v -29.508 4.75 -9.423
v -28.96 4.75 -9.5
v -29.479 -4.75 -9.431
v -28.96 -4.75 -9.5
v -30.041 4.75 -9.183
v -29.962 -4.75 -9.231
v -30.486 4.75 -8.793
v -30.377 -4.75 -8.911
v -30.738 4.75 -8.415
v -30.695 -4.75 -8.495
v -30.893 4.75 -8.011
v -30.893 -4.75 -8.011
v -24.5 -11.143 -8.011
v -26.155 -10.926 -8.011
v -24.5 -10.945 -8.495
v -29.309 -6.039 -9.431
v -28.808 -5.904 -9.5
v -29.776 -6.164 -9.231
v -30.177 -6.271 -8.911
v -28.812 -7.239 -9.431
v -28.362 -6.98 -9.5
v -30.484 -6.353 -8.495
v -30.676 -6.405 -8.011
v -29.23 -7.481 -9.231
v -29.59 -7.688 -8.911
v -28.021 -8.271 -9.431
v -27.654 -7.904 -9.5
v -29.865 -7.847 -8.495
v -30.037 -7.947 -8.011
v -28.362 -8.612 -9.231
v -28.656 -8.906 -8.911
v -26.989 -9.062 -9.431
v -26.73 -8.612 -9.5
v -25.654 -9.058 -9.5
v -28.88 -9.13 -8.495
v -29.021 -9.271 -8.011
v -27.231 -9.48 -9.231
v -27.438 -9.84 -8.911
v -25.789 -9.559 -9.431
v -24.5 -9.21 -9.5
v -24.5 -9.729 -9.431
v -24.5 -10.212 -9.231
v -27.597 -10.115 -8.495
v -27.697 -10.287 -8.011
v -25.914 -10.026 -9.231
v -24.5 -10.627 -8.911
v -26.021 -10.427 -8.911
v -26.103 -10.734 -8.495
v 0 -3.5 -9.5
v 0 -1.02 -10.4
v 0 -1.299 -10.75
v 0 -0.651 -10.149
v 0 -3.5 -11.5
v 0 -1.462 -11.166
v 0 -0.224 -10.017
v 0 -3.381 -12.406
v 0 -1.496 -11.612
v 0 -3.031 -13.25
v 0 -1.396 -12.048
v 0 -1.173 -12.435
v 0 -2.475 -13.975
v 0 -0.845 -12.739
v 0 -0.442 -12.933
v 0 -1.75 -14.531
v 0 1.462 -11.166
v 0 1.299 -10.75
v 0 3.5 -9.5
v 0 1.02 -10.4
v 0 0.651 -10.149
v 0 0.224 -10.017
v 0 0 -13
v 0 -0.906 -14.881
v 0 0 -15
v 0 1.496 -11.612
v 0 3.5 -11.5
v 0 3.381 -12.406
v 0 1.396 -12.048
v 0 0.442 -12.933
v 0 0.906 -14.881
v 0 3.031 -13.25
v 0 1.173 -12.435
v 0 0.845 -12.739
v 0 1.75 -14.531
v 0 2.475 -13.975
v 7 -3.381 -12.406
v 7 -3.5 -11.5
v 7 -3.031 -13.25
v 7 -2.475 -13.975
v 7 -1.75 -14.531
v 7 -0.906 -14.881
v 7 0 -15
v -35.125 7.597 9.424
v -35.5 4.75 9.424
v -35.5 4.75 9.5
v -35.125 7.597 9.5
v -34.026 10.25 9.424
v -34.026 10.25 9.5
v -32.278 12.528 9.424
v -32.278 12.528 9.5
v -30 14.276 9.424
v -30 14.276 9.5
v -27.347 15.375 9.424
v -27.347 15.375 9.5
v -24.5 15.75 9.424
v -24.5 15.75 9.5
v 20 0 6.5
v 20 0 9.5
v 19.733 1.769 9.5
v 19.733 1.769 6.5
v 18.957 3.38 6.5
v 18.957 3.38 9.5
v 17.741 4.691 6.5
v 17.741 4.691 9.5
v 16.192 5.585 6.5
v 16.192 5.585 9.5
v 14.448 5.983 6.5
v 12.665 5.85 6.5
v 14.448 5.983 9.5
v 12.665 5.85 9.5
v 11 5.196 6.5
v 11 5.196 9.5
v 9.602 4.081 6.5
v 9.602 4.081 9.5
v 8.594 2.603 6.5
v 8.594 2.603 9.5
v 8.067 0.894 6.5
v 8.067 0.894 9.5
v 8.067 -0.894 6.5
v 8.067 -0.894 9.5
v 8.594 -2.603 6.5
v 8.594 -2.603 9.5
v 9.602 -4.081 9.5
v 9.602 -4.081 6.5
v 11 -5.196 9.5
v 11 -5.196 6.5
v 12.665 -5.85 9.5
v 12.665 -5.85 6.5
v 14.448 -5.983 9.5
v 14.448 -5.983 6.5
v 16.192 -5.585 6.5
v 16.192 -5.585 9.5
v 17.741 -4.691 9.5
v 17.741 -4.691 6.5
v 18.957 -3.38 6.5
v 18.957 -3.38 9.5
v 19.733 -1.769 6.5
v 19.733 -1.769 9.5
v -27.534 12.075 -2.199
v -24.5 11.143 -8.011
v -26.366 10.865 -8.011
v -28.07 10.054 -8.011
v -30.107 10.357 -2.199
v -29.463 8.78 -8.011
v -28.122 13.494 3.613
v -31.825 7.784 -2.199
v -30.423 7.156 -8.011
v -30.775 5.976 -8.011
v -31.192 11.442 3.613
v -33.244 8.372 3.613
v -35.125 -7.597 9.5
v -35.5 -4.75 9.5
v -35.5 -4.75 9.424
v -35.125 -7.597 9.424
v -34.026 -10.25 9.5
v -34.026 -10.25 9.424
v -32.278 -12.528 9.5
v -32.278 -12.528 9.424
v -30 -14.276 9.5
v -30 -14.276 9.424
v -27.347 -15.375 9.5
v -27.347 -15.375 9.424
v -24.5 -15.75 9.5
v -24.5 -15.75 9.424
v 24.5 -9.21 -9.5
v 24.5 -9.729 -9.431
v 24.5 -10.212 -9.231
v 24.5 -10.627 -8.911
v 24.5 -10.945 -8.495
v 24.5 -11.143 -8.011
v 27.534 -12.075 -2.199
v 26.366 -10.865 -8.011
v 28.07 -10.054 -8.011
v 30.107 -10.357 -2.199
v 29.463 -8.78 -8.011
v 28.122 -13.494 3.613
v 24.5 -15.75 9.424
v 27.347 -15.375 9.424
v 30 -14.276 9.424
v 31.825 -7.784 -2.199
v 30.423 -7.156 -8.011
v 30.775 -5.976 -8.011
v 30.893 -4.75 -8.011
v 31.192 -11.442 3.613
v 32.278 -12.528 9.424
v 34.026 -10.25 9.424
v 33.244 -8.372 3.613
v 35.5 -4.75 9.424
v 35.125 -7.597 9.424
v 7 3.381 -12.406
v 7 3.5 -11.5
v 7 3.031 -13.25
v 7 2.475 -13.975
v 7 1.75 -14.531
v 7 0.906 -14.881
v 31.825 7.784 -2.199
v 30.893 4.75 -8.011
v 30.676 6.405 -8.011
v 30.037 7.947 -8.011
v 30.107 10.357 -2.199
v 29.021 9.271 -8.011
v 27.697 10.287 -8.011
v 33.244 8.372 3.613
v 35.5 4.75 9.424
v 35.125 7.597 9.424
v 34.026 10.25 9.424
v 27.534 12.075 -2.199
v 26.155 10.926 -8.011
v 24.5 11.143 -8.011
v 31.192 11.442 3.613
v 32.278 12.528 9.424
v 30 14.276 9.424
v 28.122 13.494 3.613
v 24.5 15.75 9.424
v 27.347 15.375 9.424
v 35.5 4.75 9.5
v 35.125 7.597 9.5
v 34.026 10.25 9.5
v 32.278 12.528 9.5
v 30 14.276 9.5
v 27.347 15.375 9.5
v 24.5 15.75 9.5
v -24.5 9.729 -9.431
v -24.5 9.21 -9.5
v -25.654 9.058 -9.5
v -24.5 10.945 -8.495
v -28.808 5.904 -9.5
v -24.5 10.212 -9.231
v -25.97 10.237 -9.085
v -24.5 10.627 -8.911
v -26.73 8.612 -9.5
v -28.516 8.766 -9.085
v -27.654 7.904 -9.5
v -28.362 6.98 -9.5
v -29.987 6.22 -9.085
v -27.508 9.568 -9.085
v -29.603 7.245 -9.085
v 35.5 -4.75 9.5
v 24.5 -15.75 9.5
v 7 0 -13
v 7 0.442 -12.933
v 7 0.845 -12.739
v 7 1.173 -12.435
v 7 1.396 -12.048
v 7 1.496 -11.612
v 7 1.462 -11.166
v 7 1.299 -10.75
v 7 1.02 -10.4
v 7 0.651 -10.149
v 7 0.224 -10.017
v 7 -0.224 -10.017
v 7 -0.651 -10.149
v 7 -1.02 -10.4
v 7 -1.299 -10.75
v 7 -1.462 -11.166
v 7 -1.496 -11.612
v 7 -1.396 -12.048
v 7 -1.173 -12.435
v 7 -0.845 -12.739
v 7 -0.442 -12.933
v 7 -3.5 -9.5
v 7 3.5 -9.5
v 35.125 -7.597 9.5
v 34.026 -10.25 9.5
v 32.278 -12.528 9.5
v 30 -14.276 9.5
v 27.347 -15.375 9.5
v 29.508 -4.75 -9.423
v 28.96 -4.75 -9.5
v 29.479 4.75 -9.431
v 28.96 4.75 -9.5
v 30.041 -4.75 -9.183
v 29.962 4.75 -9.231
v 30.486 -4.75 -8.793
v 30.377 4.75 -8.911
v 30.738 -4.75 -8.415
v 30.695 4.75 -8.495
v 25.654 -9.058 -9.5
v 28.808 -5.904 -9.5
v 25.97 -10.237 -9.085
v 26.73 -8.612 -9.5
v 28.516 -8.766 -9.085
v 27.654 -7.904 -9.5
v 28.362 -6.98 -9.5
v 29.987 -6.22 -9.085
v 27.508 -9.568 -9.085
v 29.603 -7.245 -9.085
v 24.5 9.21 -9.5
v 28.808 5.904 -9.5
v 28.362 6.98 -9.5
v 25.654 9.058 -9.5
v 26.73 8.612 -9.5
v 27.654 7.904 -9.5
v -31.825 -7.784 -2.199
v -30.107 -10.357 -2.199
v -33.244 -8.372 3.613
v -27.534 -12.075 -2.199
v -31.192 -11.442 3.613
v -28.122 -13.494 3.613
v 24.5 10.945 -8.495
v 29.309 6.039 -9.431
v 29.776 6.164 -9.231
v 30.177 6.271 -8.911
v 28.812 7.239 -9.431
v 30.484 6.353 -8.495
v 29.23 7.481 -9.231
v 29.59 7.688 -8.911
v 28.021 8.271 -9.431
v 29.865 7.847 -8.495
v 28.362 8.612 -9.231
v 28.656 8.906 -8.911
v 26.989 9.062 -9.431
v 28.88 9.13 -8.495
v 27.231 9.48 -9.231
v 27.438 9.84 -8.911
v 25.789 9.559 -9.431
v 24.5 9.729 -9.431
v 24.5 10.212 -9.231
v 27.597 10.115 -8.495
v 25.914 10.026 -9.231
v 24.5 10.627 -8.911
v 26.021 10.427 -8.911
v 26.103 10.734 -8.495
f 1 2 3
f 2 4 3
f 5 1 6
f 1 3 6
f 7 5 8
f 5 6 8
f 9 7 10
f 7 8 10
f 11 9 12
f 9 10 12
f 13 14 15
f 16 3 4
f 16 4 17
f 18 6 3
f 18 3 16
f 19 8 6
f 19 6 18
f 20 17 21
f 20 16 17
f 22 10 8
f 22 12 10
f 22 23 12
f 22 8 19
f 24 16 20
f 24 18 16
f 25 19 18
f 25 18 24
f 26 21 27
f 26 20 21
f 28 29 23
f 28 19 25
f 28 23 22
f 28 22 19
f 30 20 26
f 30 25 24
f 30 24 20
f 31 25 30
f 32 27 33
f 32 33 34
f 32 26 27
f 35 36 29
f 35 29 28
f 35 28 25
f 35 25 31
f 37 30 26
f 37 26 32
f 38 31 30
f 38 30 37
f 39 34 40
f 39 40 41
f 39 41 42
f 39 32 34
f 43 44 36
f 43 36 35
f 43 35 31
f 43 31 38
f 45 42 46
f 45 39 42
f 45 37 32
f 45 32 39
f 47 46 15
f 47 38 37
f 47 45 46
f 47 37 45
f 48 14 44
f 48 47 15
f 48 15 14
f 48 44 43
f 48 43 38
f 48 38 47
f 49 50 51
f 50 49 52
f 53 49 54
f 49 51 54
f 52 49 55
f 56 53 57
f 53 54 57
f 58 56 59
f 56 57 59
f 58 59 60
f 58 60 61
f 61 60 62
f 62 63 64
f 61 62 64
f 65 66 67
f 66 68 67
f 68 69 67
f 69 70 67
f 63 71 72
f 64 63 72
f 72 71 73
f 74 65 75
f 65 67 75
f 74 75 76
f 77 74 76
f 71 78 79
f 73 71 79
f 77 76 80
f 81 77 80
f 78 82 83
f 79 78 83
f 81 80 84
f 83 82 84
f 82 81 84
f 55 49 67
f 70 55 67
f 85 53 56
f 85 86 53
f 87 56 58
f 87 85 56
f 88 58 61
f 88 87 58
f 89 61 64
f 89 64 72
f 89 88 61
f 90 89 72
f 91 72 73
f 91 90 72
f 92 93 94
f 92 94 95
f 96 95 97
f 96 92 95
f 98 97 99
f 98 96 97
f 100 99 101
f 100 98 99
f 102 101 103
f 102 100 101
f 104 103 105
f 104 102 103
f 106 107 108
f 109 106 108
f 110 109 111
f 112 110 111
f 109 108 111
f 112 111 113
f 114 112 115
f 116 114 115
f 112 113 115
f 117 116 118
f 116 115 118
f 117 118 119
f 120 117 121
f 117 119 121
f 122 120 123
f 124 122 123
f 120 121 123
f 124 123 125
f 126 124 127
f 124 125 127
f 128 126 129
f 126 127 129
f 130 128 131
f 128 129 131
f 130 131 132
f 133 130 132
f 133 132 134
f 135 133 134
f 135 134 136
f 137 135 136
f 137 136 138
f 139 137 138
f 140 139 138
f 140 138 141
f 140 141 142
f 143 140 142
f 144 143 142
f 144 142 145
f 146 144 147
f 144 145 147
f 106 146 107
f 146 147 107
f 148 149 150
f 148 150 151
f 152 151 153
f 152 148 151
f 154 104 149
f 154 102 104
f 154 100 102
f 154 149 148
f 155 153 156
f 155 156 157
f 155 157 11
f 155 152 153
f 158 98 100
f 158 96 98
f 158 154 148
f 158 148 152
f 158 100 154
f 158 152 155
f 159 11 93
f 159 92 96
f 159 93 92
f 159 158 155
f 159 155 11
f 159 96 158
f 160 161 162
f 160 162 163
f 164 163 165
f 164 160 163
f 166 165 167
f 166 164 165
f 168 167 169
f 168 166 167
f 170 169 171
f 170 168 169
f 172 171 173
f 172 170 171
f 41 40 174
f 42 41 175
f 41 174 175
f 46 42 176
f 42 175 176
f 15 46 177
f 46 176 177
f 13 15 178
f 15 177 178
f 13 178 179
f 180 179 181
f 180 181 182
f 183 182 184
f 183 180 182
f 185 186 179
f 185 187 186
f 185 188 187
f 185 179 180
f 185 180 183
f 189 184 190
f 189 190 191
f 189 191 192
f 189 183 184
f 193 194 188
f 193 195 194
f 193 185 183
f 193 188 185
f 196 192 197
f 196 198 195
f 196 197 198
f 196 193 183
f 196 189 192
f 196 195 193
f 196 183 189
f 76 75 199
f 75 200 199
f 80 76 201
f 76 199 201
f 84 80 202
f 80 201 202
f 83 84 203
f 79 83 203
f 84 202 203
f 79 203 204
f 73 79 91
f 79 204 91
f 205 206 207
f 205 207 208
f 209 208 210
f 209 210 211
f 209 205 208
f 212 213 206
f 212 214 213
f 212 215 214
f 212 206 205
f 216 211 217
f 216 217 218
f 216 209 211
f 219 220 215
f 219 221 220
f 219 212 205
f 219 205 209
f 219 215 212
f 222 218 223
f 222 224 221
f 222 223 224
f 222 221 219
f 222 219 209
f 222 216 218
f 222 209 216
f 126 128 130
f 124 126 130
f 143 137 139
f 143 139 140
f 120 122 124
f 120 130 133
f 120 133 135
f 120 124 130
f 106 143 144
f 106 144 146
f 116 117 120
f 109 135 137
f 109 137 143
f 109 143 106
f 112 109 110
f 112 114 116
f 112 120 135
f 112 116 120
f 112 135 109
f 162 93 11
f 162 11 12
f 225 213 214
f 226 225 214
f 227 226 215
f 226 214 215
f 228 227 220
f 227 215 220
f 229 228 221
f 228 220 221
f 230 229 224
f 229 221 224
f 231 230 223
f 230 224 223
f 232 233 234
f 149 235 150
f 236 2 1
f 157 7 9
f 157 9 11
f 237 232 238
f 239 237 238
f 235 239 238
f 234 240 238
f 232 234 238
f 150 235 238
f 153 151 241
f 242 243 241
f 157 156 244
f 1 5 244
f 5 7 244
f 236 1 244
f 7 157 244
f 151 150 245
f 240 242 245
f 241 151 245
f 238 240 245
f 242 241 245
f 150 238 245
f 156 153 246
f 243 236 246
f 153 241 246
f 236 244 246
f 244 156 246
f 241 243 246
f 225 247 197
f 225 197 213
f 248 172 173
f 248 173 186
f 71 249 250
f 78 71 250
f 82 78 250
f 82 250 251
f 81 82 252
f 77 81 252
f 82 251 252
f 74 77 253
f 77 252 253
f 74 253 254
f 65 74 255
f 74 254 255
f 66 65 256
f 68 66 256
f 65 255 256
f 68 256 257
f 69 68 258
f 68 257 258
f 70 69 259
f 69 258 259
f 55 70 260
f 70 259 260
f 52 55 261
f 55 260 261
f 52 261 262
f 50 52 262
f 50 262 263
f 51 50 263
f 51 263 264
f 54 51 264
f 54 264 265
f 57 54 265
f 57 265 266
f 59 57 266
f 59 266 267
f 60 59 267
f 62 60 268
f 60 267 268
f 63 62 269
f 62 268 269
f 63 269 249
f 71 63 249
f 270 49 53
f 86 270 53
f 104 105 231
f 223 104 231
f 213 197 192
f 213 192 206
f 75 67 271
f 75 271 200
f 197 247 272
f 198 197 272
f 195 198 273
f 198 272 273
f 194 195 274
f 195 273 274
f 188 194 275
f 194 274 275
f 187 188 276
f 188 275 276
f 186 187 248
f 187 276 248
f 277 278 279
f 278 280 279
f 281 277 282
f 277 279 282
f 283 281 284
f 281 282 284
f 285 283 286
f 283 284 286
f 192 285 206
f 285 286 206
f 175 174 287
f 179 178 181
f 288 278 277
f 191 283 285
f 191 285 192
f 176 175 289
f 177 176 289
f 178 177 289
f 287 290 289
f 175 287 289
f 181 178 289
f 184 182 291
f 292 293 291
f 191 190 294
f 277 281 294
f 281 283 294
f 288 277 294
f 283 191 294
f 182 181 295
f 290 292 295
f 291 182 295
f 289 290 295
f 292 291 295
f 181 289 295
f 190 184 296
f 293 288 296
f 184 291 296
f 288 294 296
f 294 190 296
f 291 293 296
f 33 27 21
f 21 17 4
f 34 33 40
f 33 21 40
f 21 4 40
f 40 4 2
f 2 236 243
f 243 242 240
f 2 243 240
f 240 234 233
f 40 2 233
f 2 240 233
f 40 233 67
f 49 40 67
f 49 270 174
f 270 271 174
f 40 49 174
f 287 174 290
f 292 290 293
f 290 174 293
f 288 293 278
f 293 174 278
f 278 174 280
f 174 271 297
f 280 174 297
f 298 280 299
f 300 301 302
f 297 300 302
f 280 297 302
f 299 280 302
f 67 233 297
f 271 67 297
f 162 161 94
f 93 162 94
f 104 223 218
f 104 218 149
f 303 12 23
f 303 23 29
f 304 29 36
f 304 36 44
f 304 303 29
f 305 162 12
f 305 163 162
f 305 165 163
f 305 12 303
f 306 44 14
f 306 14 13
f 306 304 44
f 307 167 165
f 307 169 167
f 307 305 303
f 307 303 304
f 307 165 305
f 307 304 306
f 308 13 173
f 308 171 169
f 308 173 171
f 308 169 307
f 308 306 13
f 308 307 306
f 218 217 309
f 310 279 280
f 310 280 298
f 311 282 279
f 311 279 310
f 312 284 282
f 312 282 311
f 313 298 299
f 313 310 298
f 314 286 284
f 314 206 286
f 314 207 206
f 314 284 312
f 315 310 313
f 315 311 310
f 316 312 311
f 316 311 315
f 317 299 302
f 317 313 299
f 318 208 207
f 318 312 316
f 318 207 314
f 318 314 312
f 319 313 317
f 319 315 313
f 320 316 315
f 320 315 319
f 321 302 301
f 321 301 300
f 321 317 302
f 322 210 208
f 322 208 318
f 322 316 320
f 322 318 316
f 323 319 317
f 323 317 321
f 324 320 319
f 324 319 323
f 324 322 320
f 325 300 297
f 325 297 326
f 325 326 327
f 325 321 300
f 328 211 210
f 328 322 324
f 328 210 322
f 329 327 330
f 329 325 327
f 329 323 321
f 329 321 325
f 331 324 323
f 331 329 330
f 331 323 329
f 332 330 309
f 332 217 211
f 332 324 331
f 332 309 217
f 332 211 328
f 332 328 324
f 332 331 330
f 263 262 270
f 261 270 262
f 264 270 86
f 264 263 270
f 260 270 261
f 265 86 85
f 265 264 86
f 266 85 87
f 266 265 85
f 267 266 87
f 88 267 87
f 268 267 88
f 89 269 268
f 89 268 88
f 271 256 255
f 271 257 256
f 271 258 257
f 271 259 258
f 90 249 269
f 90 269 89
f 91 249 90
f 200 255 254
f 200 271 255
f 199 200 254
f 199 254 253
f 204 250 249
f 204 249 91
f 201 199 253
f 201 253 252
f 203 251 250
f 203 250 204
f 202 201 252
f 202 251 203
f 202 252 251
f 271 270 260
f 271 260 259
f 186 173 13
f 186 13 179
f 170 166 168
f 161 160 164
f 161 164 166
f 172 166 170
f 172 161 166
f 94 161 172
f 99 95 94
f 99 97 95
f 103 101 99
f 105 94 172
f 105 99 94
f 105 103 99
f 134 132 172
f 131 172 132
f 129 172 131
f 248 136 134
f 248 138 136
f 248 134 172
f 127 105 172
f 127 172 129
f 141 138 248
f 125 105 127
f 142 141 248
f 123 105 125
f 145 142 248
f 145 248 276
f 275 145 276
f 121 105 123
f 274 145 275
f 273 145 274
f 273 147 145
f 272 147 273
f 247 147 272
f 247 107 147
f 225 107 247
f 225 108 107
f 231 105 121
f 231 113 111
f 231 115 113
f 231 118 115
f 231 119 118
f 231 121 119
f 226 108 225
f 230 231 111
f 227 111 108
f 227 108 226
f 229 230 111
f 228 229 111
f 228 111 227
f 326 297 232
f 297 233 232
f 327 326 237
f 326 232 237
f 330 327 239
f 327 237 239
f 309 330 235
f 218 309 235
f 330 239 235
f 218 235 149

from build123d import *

# Parameters (mm, degrees)
SKETCH1_W           = 71
SKETCH1_H           = 31.5
BOSS_EXTRUDE1_DEPTH = 9.5
FILLET1_R           = 11
CHAMFER1_SIZE       = 5
CHAMFER1_SIZE2      = 18.924240442
SKETCH2_W           = 5.5
SKETCH2_H           = 7
BOSS_EXTRUDE2_DEPTH = 7
FILLET2_R           = 3.5
SKETCH3_R           = 1.5
CUT_EXTRUDE1_DEPTH  = 7
FILLET3_R           = 2
SKETCH4_R           = 6
CUT_EXTRUDE2_DEPTH  = 3


with BuildPart() as part:
    # Sketch1 → Boss-Extrude1 (new, symmetric)
    with BuildSketch(Plane.XY):
        Rectangle(SKETCH1_W, SKETCH1_H)
    extrude(amount=BOSS_EXTRUDE1_DEPTH, both=True)

    # Fillet1
    fillet1_edges = [part.edges().sort_by_distance(p)[0] for p in [
        (-35.5, 15.75, 0),
        (35.5, 15.75, 0),
        (35.5, -15.75, 0),
        (-35.5, -15.75, 0),
    ]]
    fillet(fillet1_edges, radius=FILLET1_R)

    # Chamfer1
    chamfer1_edges = [part.edges().sort_by_distance(p)[0] for p in [
        (0, -15.75, -9.5),
        (-35.5, 0, -9.5),
        (0, 15.75, -9.5),
        (35.5, 0, -9.5),
        (32.278174593, 12.528174593, -9.5),
        (32.278174593, -12.528174593, -9.5),
        (-32.278174593, 12.528174593, -9.5),
        (-32.278174593, -12.528174593, -9.5),
    ]]
    chamfer1_side = [part.faces().sort_by_distance(p)[0] for p in [
        (0, 0, -9.5),
    ]]
    chamfer(chamfer1_edges, length=CHAMFER1_SIZE, length2=CHAMFER1_SIZE2, reference=chamfer1_side[0])

    # Sketch2 → Boss-Extrude2 (add)
    with BuildSketch(Plane(origin=(0, 0, 0), x_dir=(0, 0, -1), z_dir=(1, 0, 0))):
        with Locations((12.25, 0)):
            Rectangle(SKETCH2_W, SKETCH2_H)
    extrude(amount=BOSS_EXTRUDE2_DEPTH)

    # Fillet2
    fillet2_edges = [part.edges().sort_by_distance(p)[0] for p in [
        (3.5, -3.5, -15),
        (3.5, 3.5, -15),
    ]]
    fillet(fillet2_edges, radius=FILLET2_R - 0.0001)  # a hair under: the kernel refuses the full size

    # Sketch3 → Cut-Extrude1 (cut)
    with BuildSketch(Plane(origin=(7, 0, 0), x_dir=(0, 0, -1), z_dir=(1, 0, 0))):
        with Locations((11.5, 0)):
            Circle(SKETCH3_R)
    extrude(amount=-CUT_EXTRUDE1_DEPTH, mode=Mode.SUBTRACT)

    # Fillet3
    fillet3_edges = [part.edges().sort_by_distance(p)[0] for p in [
        (0, 10.75, -9.5),
        (-28.742640687, 8.992640687, -9.5),
        (28.742640687, 8.992640687, -9.5),
        (-30.5, 0, -9.5),
        (30.5, 0, -9.5),
        (-28.742640687, -8.992640687, -9.5),
        (28.742640687, -8.992640687, -9.5),
        (0, -10.75, -9.5),
    ]]
    fillet(fillet3_edges, radius=FILLET3_R)

    # Sketch4 → Cut-Extrude2 (cut)
    with BuildSketch(Plane.XY.offset(9.5)):
        with Locations((14, 0)):
            Circle(SKETCH4_R)
    extrude(amount=-CUT_EXTRUDE2_DEPTH, mode=Mode.SUBTRACT)


solid = part.part
